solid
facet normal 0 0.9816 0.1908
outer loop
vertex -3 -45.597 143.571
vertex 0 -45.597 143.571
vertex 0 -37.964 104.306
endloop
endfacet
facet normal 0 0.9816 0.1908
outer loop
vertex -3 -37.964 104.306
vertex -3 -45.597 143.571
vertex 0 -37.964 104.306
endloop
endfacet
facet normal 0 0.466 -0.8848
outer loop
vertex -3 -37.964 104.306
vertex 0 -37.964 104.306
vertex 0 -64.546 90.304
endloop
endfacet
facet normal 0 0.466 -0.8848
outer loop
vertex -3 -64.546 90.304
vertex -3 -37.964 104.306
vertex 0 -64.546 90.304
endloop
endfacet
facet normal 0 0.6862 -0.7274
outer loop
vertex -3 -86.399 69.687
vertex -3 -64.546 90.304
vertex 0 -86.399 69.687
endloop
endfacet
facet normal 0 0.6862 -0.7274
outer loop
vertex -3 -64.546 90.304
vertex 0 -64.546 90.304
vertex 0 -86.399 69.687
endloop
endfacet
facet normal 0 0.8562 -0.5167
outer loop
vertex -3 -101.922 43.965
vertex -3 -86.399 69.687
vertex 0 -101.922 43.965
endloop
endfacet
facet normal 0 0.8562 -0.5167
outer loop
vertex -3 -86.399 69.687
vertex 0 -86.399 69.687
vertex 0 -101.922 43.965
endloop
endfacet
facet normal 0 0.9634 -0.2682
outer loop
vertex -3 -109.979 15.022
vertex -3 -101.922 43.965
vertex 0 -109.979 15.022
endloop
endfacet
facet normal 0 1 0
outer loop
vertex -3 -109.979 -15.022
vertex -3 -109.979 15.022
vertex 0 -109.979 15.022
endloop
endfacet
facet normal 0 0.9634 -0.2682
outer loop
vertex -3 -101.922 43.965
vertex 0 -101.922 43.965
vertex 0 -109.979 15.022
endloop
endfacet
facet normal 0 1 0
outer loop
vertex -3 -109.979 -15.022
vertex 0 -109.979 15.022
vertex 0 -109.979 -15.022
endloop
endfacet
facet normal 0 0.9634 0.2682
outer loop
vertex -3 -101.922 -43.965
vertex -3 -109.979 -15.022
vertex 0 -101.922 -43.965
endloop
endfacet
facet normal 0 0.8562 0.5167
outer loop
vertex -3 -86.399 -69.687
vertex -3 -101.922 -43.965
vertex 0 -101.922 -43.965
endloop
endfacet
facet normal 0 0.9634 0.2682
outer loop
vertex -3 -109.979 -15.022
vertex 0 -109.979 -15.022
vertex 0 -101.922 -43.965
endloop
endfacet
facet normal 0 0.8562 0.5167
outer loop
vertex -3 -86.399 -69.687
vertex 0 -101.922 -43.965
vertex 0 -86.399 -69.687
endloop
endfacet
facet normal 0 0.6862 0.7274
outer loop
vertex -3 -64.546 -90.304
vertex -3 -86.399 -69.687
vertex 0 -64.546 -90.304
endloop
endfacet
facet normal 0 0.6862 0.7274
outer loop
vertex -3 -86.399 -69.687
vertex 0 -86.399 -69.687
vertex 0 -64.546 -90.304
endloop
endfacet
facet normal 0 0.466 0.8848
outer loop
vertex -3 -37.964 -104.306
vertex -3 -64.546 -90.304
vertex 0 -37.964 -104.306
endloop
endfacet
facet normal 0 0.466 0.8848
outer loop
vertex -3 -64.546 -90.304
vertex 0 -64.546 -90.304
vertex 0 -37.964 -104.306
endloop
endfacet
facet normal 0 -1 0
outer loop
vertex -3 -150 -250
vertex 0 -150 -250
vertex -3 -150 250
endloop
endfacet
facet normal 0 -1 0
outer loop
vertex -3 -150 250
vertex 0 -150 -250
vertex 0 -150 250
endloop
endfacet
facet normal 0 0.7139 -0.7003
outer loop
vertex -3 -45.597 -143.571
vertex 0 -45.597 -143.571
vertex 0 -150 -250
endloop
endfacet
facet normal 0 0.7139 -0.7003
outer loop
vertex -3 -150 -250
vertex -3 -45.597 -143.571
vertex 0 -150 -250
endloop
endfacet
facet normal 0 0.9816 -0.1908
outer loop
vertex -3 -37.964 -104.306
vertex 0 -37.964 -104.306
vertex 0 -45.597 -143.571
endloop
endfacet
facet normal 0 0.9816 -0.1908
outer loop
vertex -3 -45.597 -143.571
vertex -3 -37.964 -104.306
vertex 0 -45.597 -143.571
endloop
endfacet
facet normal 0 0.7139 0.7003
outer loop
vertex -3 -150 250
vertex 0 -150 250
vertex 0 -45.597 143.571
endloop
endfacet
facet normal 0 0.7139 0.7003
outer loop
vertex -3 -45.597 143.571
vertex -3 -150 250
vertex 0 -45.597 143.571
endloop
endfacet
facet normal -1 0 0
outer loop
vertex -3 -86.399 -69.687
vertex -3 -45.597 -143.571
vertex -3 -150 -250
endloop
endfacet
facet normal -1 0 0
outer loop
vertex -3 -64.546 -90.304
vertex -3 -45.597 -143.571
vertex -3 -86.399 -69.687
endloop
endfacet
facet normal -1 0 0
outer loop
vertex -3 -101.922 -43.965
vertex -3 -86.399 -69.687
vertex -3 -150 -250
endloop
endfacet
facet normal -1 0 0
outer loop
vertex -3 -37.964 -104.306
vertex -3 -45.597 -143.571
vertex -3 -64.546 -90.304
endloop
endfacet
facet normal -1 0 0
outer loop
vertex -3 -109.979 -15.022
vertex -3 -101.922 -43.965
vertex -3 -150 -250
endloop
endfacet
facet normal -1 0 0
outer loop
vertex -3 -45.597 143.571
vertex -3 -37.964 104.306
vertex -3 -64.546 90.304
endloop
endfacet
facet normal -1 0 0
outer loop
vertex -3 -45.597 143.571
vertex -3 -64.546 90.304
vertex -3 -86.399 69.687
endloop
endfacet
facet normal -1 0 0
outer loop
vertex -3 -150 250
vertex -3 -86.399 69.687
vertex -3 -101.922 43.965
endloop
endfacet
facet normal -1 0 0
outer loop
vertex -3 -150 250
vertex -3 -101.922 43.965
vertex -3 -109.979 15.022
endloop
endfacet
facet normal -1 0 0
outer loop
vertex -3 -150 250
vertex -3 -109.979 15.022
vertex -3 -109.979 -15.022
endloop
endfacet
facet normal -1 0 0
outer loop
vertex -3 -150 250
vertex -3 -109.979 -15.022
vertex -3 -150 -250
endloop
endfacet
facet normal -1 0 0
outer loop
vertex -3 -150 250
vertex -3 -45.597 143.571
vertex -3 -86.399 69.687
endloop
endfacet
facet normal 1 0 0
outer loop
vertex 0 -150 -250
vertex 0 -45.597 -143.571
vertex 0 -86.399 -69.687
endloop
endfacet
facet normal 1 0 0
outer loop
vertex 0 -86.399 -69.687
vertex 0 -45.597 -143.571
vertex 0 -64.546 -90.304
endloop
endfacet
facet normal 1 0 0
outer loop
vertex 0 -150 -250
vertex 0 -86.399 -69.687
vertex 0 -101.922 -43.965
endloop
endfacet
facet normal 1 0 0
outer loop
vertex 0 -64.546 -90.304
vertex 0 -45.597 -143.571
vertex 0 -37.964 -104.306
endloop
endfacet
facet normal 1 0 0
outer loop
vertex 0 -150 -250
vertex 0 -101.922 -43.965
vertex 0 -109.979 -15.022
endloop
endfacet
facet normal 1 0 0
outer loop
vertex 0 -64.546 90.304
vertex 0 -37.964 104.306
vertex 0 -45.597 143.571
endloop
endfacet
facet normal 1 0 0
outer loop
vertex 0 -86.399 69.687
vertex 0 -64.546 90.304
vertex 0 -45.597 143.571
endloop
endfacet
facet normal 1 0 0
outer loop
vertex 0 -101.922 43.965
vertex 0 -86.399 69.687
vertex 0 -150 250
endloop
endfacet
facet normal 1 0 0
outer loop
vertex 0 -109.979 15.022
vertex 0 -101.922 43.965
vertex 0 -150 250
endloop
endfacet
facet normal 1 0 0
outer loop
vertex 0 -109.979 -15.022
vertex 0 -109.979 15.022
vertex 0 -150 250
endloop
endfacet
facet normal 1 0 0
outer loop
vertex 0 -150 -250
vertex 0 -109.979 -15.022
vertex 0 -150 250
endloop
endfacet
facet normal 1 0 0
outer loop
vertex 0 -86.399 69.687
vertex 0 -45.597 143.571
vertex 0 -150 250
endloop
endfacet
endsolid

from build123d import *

# Parameters (mm, degrees)
SM_BASE_FLANGE_1_DEPTH = 3


# Sheet-metal steps are written as plain solids
with BuildPart() as part:
    # Sketch 1 → Базовая кромка1 (new body)
    with BuildSketch(Plane(origin=(0, 0, 0), x_dir=(0, 0, -1), z_dir=(1, 0, 0))):
        with BuildLine():
            Line((250, -150), (-250, -150))
            Line((-250, -150), (-143.570968245, -45.596595724))
            Line((-143.570968245, -45.596595724), (-104.305880907, -37.964235909))
            ThreePointArc((-104.305880907, -37.964235909), (0, -111), (104.305880907, -37.964235909))
            Line((104.305880907, -37.964235909), (143.570968245, -45.596595724))
            Line((143.570968245, -45.596595724), (250, -150))
        make_face()
    extrude(amount=-SM_BASE_FLANGE_1_DEPTH)


solid = part.part
